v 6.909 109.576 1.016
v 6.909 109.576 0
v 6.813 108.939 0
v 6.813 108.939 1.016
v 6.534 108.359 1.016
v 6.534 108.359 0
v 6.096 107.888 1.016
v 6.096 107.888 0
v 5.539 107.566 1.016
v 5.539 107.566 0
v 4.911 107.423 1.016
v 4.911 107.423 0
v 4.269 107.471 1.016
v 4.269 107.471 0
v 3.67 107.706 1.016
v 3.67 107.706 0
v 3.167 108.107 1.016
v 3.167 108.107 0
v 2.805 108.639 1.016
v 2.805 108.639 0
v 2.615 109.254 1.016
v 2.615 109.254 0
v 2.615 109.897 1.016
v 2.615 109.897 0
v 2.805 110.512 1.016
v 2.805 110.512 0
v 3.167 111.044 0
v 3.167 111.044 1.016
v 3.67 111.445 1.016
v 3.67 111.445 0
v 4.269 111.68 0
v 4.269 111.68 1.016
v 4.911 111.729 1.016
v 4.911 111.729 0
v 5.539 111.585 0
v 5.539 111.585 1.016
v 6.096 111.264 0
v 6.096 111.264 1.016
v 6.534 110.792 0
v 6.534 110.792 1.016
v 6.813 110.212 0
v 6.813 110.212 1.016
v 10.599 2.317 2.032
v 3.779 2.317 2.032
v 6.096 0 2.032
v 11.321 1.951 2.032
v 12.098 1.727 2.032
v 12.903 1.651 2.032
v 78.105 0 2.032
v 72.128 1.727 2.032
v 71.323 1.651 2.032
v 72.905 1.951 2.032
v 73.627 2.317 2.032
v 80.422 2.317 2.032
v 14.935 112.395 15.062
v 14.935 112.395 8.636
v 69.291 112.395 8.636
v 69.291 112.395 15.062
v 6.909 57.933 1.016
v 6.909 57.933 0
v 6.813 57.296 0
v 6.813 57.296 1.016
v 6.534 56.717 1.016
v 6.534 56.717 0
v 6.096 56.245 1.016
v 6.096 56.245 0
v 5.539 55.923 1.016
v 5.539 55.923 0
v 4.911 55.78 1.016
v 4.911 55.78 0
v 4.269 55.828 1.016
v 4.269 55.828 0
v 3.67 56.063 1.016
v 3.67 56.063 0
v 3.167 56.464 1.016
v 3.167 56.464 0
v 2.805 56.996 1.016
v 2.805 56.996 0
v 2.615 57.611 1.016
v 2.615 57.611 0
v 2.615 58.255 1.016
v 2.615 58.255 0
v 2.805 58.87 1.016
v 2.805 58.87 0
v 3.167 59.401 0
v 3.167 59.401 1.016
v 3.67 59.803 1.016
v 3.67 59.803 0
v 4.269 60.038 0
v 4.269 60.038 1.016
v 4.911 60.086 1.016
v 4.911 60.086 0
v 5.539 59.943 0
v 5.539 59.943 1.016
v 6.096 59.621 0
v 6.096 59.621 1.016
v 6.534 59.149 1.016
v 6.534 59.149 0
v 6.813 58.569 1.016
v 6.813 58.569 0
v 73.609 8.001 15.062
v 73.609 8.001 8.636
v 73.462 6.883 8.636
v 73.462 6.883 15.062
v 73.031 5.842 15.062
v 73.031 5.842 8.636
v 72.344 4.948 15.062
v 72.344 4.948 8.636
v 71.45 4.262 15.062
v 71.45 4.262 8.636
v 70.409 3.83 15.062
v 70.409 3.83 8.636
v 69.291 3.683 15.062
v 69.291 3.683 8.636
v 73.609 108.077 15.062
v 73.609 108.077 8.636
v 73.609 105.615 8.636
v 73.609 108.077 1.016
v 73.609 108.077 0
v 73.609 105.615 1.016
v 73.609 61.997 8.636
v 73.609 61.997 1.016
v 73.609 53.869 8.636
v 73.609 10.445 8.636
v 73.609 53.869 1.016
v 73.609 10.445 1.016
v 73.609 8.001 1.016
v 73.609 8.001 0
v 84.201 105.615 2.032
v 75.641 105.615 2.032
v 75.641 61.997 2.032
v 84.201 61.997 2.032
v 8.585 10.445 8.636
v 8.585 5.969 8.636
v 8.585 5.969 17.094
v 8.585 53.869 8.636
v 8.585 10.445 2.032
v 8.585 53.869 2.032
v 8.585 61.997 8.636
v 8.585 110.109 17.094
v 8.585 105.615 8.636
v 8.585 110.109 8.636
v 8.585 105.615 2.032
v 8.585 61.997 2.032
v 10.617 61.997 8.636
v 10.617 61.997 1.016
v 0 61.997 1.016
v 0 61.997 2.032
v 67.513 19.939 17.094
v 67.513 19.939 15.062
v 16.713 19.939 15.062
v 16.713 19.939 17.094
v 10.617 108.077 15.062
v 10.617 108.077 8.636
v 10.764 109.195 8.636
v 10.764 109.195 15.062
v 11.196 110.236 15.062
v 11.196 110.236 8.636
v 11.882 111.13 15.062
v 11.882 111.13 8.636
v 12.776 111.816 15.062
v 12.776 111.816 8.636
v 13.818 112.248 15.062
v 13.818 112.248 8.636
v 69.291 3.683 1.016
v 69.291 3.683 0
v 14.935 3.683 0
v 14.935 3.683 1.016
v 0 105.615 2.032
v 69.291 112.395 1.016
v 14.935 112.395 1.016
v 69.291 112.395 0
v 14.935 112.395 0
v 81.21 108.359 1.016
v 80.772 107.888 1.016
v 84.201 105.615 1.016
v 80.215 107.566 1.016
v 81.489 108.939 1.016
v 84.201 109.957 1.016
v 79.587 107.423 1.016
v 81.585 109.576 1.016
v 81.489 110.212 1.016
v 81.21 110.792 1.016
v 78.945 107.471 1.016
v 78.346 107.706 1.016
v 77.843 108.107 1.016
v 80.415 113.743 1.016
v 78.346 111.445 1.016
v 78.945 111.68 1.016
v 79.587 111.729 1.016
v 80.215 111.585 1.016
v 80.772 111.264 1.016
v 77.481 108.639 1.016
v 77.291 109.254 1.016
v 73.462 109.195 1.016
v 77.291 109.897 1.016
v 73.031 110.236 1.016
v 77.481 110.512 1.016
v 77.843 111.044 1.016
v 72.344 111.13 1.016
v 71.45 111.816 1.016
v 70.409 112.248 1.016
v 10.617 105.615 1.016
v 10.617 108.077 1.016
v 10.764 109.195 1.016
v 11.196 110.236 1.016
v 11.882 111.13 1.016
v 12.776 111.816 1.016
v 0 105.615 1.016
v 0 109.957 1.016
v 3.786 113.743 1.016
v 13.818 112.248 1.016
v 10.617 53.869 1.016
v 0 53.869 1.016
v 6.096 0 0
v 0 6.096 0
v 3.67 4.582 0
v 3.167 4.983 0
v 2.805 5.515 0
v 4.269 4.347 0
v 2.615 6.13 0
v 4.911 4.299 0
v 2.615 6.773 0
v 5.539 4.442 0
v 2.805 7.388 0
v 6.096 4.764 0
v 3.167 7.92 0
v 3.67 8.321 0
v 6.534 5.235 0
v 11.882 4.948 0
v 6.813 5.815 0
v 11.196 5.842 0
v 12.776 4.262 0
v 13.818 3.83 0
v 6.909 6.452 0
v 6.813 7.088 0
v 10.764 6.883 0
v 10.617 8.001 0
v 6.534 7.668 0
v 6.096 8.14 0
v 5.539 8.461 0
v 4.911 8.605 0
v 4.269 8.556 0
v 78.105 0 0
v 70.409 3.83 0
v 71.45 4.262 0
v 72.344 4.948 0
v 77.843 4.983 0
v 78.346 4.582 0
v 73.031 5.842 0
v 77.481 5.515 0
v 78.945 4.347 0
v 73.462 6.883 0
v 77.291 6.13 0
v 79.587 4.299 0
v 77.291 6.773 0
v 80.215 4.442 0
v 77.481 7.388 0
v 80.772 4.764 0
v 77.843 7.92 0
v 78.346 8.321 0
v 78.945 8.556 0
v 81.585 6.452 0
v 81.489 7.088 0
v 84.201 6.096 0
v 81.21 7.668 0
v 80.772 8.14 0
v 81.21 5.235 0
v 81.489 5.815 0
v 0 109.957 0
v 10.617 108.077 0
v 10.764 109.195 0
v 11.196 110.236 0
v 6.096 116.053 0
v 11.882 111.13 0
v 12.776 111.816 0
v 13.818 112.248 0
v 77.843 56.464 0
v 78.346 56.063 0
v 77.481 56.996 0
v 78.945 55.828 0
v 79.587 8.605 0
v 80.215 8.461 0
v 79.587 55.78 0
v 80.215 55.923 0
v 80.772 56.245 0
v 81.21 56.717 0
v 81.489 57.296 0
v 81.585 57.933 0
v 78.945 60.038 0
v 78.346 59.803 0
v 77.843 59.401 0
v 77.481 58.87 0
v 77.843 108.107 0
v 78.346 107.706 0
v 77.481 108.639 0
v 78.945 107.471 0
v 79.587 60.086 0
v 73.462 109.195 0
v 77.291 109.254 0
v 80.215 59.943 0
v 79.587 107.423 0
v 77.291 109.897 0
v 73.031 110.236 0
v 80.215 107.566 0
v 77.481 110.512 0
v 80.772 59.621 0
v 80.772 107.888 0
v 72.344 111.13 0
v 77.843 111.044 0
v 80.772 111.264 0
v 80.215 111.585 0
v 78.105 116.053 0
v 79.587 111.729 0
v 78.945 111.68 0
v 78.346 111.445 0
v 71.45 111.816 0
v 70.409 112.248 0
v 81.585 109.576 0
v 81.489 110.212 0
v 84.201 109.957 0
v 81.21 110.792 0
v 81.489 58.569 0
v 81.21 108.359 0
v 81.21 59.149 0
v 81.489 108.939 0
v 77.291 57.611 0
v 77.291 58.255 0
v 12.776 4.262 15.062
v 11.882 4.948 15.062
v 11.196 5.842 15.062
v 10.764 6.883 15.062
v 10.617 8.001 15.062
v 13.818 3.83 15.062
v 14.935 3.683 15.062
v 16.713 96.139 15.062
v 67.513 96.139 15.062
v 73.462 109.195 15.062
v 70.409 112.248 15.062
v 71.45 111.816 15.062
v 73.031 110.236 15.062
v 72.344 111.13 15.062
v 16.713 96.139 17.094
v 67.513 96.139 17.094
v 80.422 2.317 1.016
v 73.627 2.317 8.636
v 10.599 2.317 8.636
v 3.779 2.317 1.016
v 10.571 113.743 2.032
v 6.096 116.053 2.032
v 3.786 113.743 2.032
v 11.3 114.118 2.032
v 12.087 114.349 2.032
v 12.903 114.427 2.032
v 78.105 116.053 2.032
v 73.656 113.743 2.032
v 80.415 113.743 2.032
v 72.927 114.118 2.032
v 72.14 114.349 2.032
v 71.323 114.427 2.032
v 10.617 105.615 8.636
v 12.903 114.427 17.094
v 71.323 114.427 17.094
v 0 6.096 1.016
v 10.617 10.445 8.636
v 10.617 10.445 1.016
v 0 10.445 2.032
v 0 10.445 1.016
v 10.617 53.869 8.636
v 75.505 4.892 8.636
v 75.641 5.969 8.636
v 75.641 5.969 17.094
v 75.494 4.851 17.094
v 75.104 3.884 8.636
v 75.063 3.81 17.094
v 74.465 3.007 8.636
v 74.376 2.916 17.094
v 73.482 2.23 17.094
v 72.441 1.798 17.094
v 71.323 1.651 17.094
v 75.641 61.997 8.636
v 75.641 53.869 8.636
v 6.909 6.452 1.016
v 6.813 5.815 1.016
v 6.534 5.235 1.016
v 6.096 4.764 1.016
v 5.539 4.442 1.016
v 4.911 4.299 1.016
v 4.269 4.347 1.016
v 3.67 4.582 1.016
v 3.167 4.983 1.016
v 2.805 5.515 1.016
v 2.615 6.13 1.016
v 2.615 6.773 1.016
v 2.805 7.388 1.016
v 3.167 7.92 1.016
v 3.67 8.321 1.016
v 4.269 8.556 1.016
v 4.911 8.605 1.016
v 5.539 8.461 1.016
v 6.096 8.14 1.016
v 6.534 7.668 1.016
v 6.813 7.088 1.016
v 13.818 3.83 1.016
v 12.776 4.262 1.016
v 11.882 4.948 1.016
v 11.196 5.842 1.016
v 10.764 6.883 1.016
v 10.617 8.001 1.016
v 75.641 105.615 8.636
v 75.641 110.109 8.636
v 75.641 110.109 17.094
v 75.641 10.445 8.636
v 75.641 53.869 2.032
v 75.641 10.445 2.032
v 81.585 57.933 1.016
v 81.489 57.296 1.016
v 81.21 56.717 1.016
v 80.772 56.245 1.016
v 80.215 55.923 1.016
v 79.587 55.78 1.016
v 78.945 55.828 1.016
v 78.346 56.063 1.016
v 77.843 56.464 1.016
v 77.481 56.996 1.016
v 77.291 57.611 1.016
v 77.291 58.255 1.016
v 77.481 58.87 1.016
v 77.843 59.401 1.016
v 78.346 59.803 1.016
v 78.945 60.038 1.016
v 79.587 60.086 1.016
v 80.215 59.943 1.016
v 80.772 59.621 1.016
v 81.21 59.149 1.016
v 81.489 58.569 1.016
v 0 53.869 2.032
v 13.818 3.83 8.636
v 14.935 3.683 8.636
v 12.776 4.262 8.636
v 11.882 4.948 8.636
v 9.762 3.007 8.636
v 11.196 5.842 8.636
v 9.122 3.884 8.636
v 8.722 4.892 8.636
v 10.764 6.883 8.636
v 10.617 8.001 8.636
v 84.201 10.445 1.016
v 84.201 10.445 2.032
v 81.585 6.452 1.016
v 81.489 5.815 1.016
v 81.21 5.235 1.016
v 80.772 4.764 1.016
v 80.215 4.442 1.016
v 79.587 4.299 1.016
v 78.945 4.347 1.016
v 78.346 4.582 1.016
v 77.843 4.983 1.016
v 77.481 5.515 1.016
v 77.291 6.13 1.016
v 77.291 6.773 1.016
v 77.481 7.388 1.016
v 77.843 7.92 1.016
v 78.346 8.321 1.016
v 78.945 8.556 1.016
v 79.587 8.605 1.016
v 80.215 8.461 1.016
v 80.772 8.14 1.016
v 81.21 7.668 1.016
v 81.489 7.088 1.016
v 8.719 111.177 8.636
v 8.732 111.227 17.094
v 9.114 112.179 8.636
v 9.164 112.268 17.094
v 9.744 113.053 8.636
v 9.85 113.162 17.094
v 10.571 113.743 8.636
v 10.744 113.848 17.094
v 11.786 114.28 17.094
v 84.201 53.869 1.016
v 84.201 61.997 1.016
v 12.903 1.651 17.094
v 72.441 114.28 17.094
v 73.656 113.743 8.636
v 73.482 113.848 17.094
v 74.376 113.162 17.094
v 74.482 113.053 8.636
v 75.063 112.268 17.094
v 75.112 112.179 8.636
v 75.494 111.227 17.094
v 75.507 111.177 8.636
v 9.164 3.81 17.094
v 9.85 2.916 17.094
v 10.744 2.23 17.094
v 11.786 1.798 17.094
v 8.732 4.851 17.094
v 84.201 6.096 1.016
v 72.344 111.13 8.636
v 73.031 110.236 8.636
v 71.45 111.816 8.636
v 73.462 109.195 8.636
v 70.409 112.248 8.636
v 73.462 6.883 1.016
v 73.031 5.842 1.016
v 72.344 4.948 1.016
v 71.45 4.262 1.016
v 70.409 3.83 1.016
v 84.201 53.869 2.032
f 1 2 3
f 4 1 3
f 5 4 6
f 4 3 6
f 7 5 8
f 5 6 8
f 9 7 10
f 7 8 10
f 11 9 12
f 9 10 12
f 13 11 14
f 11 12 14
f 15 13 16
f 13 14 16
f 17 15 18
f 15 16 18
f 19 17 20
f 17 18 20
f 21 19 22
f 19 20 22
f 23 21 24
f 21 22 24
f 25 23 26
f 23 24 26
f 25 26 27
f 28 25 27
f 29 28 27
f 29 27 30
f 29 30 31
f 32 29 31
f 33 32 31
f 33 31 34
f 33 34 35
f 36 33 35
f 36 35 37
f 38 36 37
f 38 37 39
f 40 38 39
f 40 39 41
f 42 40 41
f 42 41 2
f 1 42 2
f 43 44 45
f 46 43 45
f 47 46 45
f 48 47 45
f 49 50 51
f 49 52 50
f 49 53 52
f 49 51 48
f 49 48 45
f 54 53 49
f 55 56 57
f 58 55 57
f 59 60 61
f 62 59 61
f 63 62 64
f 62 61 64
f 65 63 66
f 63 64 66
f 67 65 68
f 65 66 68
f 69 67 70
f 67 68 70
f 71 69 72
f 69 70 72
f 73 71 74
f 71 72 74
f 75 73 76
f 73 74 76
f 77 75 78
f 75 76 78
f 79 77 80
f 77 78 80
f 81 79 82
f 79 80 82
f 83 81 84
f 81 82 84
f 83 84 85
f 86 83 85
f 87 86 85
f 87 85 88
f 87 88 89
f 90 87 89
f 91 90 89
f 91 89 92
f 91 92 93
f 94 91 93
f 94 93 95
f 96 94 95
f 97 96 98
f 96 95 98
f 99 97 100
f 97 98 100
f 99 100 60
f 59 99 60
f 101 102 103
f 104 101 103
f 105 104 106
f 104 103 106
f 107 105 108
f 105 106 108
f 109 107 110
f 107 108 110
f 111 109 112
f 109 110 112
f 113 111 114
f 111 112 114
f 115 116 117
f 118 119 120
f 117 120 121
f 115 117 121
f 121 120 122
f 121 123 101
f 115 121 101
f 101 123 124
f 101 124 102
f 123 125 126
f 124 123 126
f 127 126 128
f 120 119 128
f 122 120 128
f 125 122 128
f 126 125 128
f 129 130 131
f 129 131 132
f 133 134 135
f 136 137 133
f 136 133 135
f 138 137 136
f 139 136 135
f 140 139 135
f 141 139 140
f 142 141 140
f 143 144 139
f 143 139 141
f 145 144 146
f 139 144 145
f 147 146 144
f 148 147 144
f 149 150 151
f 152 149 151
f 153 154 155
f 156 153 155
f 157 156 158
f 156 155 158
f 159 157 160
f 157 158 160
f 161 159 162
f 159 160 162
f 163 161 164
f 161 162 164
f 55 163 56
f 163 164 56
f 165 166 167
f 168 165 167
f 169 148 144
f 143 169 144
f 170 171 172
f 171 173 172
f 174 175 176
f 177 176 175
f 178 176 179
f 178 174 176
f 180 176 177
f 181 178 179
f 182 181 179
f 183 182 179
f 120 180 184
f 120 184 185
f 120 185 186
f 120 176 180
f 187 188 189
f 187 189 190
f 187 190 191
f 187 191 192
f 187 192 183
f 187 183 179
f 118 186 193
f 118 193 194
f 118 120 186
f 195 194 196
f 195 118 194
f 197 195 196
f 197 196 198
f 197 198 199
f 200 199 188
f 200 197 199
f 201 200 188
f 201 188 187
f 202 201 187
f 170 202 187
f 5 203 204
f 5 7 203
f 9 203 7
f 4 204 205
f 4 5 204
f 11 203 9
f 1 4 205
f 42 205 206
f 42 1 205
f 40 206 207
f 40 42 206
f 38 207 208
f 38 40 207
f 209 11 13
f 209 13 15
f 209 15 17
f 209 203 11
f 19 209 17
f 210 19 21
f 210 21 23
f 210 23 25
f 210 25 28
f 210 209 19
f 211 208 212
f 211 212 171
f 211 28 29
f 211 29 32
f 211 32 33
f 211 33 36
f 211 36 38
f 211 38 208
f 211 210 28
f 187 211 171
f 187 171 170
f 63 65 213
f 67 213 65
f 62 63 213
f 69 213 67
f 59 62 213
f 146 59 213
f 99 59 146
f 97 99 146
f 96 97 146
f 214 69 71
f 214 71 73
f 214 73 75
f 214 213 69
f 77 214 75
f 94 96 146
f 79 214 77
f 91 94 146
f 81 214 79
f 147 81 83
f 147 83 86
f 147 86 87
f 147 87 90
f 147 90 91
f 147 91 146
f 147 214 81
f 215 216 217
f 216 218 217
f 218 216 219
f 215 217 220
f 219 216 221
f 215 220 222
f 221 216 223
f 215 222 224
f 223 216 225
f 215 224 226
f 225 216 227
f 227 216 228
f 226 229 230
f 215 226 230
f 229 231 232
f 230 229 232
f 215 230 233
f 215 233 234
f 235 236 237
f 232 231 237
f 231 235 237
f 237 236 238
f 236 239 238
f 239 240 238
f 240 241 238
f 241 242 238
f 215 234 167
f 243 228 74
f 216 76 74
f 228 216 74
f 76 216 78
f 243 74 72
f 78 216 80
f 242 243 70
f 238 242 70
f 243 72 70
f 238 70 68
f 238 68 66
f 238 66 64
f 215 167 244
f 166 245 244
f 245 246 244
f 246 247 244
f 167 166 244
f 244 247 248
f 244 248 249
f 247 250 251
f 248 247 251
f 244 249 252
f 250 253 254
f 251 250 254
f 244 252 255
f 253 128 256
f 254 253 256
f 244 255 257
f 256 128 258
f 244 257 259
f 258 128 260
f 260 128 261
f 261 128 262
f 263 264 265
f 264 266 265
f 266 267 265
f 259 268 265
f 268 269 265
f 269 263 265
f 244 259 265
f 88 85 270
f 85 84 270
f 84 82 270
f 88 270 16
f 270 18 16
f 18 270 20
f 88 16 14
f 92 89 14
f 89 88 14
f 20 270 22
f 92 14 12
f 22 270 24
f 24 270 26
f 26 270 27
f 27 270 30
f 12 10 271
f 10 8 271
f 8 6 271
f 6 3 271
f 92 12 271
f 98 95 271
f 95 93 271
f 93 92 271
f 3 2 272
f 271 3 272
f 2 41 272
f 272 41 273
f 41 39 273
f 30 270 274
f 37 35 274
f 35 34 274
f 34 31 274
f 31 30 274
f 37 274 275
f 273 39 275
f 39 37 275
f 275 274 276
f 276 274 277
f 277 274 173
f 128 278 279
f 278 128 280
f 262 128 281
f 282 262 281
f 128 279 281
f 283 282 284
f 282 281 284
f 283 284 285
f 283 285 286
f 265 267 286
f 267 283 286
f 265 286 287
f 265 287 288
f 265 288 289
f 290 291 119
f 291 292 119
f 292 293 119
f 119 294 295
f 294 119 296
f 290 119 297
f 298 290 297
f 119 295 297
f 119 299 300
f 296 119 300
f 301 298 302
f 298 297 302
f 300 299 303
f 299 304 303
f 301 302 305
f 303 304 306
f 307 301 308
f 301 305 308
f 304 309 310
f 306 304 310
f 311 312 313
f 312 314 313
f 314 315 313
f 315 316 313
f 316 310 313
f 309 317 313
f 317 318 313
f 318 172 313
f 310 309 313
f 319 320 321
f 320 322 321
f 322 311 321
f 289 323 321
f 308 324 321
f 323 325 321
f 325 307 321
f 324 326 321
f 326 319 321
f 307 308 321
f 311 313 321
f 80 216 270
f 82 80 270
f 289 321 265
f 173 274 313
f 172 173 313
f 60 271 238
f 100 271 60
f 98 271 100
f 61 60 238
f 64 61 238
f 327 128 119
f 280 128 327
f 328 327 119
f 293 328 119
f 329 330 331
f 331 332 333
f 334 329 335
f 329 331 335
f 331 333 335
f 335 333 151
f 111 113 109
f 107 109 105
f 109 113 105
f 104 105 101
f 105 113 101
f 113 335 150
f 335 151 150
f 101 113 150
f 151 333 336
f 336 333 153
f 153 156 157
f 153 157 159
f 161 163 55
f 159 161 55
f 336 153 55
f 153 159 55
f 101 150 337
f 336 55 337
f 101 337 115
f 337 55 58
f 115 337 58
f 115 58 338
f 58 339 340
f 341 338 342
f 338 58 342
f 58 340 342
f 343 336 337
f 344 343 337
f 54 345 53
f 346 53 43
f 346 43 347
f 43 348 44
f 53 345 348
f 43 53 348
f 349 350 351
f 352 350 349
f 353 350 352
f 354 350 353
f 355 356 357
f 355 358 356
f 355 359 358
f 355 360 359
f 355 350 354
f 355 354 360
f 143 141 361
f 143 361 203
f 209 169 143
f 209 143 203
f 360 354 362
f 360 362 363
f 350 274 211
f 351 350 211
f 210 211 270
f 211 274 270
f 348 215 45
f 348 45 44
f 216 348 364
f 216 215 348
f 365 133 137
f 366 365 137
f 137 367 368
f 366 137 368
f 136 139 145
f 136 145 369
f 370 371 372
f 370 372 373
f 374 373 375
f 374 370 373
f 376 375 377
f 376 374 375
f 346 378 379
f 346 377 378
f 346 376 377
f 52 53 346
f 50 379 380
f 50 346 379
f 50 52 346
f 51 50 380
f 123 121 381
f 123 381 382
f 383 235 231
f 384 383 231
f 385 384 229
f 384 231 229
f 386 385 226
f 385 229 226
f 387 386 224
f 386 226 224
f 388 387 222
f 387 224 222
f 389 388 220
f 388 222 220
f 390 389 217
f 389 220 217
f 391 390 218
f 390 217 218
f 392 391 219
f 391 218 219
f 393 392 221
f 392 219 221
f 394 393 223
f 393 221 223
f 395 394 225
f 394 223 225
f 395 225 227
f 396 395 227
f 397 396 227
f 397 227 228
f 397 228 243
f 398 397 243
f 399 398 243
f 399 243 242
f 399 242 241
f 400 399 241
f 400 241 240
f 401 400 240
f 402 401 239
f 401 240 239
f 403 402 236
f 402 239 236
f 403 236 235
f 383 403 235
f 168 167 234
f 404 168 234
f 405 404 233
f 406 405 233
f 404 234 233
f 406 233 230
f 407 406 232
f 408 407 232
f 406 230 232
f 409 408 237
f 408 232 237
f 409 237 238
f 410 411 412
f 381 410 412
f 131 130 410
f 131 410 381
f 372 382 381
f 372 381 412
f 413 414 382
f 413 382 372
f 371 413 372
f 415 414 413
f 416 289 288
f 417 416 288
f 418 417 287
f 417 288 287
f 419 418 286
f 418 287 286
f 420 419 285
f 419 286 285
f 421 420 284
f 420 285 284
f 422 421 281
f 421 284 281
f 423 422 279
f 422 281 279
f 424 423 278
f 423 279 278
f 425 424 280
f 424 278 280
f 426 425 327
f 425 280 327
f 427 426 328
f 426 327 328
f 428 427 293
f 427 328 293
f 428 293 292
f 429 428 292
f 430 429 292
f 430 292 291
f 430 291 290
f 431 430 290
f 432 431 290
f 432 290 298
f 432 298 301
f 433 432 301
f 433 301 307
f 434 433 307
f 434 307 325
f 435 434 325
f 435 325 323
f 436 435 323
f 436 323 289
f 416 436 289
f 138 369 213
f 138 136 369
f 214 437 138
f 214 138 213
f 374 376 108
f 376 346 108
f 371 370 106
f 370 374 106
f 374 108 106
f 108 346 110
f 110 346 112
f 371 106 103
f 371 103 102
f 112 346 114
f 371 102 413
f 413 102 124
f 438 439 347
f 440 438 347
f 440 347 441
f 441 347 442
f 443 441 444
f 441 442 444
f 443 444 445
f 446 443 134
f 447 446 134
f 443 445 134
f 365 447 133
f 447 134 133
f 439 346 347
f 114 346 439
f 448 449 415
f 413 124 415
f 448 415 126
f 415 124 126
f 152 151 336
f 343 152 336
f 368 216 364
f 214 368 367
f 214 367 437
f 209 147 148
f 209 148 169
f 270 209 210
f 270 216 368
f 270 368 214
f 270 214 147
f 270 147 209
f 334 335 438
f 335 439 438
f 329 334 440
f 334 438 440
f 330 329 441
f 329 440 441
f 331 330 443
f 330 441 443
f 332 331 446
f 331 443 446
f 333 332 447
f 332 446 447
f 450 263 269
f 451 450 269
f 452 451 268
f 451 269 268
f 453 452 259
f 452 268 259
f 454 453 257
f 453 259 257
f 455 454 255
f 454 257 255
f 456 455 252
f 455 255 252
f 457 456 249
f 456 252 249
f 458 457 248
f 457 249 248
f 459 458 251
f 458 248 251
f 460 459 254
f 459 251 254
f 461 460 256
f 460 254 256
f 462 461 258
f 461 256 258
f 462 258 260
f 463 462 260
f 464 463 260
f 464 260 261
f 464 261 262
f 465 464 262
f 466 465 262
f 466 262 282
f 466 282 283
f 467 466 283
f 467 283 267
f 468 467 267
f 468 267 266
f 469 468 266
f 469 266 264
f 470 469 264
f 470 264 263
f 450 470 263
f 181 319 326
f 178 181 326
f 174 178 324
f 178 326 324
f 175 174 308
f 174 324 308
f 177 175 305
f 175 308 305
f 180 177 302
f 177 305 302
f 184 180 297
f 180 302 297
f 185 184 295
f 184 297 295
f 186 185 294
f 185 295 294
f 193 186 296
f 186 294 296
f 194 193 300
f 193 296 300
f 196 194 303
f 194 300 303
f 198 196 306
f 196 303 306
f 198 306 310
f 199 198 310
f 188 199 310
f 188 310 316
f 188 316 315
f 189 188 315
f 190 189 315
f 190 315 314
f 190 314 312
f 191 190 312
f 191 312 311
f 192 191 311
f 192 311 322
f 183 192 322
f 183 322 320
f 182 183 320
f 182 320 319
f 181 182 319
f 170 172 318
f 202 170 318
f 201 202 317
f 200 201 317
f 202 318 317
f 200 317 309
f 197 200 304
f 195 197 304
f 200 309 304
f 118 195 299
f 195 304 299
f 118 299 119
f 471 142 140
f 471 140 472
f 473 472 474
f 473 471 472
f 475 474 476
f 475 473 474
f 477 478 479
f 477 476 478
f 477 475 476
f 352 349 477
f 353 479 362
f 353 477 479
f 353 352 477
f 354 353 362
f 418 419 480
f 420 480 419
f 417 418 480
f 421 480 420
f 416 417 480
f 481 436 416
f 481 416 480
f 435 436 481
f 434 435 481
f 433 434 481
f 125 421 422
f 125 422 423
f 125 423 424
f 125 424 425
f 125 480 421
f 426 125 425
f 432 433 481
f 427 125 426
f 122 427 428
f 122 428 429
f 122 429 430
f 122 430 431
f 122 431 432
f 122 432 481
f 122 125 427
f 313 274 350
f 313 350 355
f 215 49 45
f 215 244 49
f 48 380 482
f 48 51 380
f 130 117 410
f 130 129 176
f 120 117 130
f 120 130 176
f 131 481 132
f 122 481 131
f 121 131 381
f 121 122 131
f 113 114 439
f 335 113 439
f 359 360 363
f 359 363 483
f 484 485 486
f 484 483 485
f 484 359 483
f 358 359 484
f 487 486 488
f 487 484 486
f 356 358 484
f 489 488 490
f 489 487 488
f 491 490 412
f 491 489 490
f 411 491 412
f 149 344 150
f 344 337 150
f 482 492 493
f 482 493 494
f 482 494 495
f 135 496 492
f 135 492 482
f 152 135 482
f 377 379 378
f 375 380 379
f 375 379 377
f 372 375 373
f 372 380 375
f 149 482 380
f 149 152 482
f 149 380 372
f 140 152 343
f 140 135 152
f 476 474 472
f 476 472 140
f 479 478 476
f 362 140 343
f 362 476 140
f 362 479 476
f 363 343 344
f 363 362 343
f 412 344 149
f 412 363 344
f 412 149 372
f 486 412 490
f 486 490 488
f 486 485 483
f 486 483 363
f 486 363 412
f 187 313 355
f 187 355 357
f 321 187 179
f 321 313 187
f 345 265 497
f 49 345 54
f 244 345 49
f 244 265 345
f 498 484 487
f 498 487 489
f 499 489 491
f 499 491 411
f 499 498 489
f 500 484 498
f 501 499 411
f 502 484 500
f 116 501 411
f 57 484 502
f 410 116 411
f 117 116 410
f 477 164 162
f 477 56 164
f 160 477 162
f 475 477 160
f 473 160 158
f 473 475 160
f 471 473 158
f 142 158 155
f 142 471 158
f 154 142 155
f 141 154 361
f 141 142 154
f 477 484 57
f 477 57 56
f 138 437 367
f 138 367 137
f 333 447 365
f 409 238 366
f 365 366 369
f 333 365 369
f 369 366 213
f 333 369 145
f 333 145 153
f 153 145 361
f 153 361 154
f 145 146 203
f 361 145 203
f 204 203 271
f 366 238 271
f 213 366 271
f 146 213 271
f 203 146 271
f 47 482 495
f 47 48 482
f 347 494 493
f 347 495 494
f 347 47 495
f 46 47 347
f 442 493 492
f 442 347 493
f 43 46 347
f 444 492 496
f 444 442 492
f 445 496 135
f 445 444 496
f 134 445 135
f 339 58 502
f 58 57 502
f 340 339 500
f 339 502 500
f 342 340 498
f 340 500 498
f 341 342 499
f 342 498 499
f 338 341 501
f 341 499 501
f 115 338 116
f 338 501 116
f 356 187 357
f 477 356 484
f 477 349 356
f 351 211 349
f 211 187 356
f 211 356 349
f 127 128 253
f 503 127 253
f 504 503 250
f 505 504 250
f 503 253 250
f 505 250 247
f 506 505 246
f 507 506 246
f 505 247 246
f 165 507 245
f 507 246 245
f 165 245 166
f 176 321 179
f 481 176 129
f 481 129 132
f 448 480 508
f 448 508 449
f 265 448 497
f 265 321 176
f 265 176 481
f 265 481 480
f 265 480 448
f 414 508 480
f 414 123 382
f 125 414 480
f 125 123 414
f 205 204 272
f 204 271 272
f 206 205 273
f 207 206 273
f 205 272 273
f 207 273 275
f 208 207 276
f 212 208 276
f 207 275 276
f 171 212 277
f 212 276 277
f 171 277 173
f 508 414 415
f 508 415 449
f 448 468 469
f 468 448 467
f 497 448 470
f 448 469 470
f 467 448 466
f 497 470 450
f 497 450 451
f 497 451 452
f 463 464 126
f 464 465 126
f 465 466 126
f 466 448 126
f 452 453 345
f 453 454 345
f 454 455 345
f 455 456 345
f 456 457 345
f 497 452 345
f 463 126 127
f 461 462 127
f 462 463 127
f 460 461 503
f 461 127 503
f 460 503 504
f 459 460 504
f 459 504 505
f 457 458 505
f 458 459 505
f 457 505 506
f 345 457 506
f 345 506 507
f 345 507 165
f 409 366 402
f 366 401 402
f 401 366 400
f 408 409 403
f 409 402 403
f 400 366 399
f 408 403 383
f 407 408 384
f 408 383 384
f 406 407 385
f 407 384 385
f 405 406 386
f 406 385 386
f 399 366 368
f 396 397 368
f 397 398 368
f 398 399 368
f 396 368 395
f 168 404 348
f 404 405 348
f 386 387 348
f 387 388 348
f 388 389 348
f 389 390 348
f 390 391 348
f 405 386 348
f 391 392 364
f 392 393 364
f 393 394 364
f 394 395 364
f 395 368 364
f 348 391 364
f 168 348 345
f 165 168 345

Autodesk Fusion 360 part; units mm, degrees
sketch "Sketch1" plane through (0, 0, 0) normal (0, 0, 1) x (1, 0, 0)
  line L0 (29.0445, 57.9328) -> (-12.0026, 57.9328) construction
  line L1 (41.7104, -9.3698) -> (41.7104, 10.2984) construction
  line L2 (41.7104, 10.2984) -> (41.7104, 122.9631) construction
  line L3 (29.0445, 57.9328) -> (97.0807, 57.9328) construction
  line L4 (4.7498, 120.3976) -> (4.7498, -5.9492) construction
  line L5 (79.4258, 120.3976) -> (79.4258, -5.9492) construction
  line L6 (-5.9061, 109.5756) -> (91.9438, 109.5756) construction
  line L7 (-5.9061, 6.4516) -> (90.0293, 6.4516) construction
  line L8 (6.096, 116.0526) -> (78.105, 116.0526)
  line L9 (84.201, 109.9566) -> (84.201, 6.096)
  line L10 (78.105, 0) -> (6.096, 0)
  line L11 (0, 6.096) -> (0, 109.9566)
  line L12 (6.096, 116.0526) -> (0, 109.9566)
  line L13 (78.105, 116.0526) -> (84.201, 109.9566)
  line L14 (84.201, 6.096) -> (78.105, 0)
  line L15 (6.096, 0) -> (0, 6.096)
  circle A0 centre (79.4258, 109.5756) radius 2.159
  circle A1 centre (4.7498, 109.5756) radius 2.159
  circle A2 centre (4.7498, 6.4516) radius 2.159
  circle A3 centre (79.4258, 6.4516) radius 2.159
  circle A4 centre (79.4258, 57.9328) radius 2.159
  circle A5 centre (4.7498, 57.9328) radius 2.159
  line L16 (12.9032, 114.427) -> (71.3232, 114.427)
  line L17 (75.6412, 110.109) -> (75.6412, 5.969)
  line L18 (71.3232, 1.651) -> (12.9032, 1.651)
  line L19 (8.5852, 5.969) -> (8.5852, 110.109)
  line L20 (14.9352, 112.395) -> (69.2912, 112.395)
  line L21 (73.6092, 108.077) -> (73.6092, 8.001)
  line L22 (69.2912, 3.683) -> (14.9352, 3.683)
  line L23 (10.6172, 8.001) -> (10.6172, 108.077)
  line L24 (16.7132, 96.139) -> (67.5132, 96.139)
  line L25 (67.5132, 96.139) -> (67.5132, 19.939)
  line L26 (67.5132, 19.939) -> (16.7132, 19.939)
  line L27 (16.7132, 19.939) -> (16.7132, 96.139)
  arc A6 (14.9352, 112.395) -> (10.6172, 108.077) centre (14.9352, 108.077) ccw
  arc A7 (73.6092, 108.077) -> (69.2912, 112.395) centre (69.2912, 108.077) ccw
  arc A8 (10.6172, 8.001) -> (14.9352, 3.683) centre (14.9352, 8.001) ccw
  arc A9 (69.2912, 3.683) -> (73.6092, 8.001) centre (69.2912, 8.001) ccw
  arc A10 (75.6412, 110.109) -> (71.3232, 114.427) centre (71.3232, 110.109) ccw
  arc A11 (12.9032, 114.427) -> (8.5852, 110.109) centre (12.9032, 110.109) ccw
  arc A12 (71.3232, 1.651) -> (75.6412, 5.969) centre (71.3232, 5.969) ccw
  arc A13 (8.5852, 5.969) -> (12.9032, 1.651) centre (12.9032, 5.969) ccw
  point P0 (84.201, 0)
  point P1 (0, 116.0526)
  point P2 (0, 116.0526)
  point P3 (84.201, 116.0526)
  point P4 (84.201, 0)
  point P5 (8.5852, 114.427)
  point P6 (75.6412, 114.427)
  point P7 (8.5852, 1.651)
  point P8 (10.6172, 112.395)
  point P9 (73.6092, 112.395)
  point P10 (10.6172, 3.683)
  dimension "d3" = 74.676
  dimension "d60" = 116.0526
  dimension "d61" = 84.201
  dimension "d62" = 6.096
  dimension "d63" = 6.096
  dimension "d64" = 6.096
  dimension "d65" = 6.096
  dimension "d66" = 6.096
  dimension "d67" = 6.096
  dimension "d68" = 6.096
  dimension "d69" = 6.096
  dimension "d72" = 4.318
  dimension "d73" = 4.318
  dimension "d74" = 4.318
  dimension "d75" = 4.318
  dimension "d76" = 4.318
  dimension "d77" = 4.318
  dimension "d78" = 67.056
  dimension "d79" = 112.776
  dimension "d80" = 1.6256
  dimension "d81" = 8.5598
  dimension "d82" = 108.712
  dimension "d83" = 62.992
  dimension "d84" = 2.032
  dimension "d85" = 2.032
  dimension "d86" = 76.2
  dimension "d87" = 16.256
  dimension "d88" = 50.8
  dimension "d89" = 6.096
  dimension "d98" = 4.318
  dimension "d99" = 4.318
  dimension "d100" = 4.318
  dimension "d101" = 4.318
  dimension "d102" = 4.318
  dimension "d103" = 4.318
  dimension "d104" = 4.318
  dimension "d105" = 4.318
sketch "Sketch2" plane through (0, 0, 0) normal (1, 0, 0) x (0, 1, 0)
  line L0 (53.8688, 1.016) -> (61.9968, 1.016)
  line L1 (61.9968, 1.016) -> (61.9968, 8.636)
  line L2 (61.9968, 8.636) -> (53.8688, 8.636)
  line L3 (53.8688, 8.636) -> (53.8688, 1.016)
  line L4 (3.8862, 0) -> (112.1664, 0)
  line L5 (6.3809, 11.5089) -> (6.3809, -11.5297) construction
  line L6 (109.6788, 11.6549) -> (109.6788, -6.3065) construction
  line L7 (105.6148, 1.016) -> (113.7428, 1.016)
  line L8 (113.7428, 1.016) -> (113.7428, 8.636)
  line L9 (113.7428, 8.636) -> (105.6148, 8.636)
  line L10 (105.6148, 8.636) -> (105.6148, 1.016)
  line L11 (109.9566, 0) -> (6.096, 0)
  line L12 (10.4449, 1.016) -> (2.3169, 1.016)
  line L13 (2.3169, 1.016) -> (2.3169, 8.636)
  line L14 (2.3169, 8.636) -> (10.4449, 8.636)
  line L15 (10.4449, 8.636) -> (10.4449, 1.016)
  point P0 (57.9328, 0)
  dimension "d46" = 7.62
  dimension "d47" = 8.128
  dimension "d48" = 4.064
  dimension "d49" = 1.016
  dimension "d106" = 7.62
  dimension "d107" = 8.128
  dimension "d108" = 1.016
  dimension "d109" = 7.62
  dimension "d110" = 8.128
  dimension "d111" = 1.016
  dimension "d112" = 4.064
  dimension "d113" = 4.064
extrude "Extrude6" add sketch "Sketch1" along normal blind 2.032 contours L8 L9 L10 L11 L12 L13 L14 L15
extrude "Extrude7" add sketch "Sketch1" along normal blind 17.0942 contours L16 L17 L18 L19 A10 A11 A12 A13
extrude "Extrude8" add sketch "Sketch1" along normal blind 17.0942 contours L20 L21 L22 L23 A6 A7 A8 A9
extrude "Extrude9" cut sketch "Sketch1" along normal blind 15.0622 contours L20 L21 L22 L23 A6 A7 A8 A9
extrude "Extrude10" cut sketch "Sketch2" along normal through all contours L0 L1 L2 L3
extrude "Extrude11" cut sketch "Sketch2" along normal through all contours L7 L8 L9 L10
extrude "Extrude12" cut sketch "Sketch2" along normal through all contours L12 L13 L14 L15
equation "d63 = d62"
equation "d65 = d64"
equation "d67 = d66"
equation "d69 = d68"
